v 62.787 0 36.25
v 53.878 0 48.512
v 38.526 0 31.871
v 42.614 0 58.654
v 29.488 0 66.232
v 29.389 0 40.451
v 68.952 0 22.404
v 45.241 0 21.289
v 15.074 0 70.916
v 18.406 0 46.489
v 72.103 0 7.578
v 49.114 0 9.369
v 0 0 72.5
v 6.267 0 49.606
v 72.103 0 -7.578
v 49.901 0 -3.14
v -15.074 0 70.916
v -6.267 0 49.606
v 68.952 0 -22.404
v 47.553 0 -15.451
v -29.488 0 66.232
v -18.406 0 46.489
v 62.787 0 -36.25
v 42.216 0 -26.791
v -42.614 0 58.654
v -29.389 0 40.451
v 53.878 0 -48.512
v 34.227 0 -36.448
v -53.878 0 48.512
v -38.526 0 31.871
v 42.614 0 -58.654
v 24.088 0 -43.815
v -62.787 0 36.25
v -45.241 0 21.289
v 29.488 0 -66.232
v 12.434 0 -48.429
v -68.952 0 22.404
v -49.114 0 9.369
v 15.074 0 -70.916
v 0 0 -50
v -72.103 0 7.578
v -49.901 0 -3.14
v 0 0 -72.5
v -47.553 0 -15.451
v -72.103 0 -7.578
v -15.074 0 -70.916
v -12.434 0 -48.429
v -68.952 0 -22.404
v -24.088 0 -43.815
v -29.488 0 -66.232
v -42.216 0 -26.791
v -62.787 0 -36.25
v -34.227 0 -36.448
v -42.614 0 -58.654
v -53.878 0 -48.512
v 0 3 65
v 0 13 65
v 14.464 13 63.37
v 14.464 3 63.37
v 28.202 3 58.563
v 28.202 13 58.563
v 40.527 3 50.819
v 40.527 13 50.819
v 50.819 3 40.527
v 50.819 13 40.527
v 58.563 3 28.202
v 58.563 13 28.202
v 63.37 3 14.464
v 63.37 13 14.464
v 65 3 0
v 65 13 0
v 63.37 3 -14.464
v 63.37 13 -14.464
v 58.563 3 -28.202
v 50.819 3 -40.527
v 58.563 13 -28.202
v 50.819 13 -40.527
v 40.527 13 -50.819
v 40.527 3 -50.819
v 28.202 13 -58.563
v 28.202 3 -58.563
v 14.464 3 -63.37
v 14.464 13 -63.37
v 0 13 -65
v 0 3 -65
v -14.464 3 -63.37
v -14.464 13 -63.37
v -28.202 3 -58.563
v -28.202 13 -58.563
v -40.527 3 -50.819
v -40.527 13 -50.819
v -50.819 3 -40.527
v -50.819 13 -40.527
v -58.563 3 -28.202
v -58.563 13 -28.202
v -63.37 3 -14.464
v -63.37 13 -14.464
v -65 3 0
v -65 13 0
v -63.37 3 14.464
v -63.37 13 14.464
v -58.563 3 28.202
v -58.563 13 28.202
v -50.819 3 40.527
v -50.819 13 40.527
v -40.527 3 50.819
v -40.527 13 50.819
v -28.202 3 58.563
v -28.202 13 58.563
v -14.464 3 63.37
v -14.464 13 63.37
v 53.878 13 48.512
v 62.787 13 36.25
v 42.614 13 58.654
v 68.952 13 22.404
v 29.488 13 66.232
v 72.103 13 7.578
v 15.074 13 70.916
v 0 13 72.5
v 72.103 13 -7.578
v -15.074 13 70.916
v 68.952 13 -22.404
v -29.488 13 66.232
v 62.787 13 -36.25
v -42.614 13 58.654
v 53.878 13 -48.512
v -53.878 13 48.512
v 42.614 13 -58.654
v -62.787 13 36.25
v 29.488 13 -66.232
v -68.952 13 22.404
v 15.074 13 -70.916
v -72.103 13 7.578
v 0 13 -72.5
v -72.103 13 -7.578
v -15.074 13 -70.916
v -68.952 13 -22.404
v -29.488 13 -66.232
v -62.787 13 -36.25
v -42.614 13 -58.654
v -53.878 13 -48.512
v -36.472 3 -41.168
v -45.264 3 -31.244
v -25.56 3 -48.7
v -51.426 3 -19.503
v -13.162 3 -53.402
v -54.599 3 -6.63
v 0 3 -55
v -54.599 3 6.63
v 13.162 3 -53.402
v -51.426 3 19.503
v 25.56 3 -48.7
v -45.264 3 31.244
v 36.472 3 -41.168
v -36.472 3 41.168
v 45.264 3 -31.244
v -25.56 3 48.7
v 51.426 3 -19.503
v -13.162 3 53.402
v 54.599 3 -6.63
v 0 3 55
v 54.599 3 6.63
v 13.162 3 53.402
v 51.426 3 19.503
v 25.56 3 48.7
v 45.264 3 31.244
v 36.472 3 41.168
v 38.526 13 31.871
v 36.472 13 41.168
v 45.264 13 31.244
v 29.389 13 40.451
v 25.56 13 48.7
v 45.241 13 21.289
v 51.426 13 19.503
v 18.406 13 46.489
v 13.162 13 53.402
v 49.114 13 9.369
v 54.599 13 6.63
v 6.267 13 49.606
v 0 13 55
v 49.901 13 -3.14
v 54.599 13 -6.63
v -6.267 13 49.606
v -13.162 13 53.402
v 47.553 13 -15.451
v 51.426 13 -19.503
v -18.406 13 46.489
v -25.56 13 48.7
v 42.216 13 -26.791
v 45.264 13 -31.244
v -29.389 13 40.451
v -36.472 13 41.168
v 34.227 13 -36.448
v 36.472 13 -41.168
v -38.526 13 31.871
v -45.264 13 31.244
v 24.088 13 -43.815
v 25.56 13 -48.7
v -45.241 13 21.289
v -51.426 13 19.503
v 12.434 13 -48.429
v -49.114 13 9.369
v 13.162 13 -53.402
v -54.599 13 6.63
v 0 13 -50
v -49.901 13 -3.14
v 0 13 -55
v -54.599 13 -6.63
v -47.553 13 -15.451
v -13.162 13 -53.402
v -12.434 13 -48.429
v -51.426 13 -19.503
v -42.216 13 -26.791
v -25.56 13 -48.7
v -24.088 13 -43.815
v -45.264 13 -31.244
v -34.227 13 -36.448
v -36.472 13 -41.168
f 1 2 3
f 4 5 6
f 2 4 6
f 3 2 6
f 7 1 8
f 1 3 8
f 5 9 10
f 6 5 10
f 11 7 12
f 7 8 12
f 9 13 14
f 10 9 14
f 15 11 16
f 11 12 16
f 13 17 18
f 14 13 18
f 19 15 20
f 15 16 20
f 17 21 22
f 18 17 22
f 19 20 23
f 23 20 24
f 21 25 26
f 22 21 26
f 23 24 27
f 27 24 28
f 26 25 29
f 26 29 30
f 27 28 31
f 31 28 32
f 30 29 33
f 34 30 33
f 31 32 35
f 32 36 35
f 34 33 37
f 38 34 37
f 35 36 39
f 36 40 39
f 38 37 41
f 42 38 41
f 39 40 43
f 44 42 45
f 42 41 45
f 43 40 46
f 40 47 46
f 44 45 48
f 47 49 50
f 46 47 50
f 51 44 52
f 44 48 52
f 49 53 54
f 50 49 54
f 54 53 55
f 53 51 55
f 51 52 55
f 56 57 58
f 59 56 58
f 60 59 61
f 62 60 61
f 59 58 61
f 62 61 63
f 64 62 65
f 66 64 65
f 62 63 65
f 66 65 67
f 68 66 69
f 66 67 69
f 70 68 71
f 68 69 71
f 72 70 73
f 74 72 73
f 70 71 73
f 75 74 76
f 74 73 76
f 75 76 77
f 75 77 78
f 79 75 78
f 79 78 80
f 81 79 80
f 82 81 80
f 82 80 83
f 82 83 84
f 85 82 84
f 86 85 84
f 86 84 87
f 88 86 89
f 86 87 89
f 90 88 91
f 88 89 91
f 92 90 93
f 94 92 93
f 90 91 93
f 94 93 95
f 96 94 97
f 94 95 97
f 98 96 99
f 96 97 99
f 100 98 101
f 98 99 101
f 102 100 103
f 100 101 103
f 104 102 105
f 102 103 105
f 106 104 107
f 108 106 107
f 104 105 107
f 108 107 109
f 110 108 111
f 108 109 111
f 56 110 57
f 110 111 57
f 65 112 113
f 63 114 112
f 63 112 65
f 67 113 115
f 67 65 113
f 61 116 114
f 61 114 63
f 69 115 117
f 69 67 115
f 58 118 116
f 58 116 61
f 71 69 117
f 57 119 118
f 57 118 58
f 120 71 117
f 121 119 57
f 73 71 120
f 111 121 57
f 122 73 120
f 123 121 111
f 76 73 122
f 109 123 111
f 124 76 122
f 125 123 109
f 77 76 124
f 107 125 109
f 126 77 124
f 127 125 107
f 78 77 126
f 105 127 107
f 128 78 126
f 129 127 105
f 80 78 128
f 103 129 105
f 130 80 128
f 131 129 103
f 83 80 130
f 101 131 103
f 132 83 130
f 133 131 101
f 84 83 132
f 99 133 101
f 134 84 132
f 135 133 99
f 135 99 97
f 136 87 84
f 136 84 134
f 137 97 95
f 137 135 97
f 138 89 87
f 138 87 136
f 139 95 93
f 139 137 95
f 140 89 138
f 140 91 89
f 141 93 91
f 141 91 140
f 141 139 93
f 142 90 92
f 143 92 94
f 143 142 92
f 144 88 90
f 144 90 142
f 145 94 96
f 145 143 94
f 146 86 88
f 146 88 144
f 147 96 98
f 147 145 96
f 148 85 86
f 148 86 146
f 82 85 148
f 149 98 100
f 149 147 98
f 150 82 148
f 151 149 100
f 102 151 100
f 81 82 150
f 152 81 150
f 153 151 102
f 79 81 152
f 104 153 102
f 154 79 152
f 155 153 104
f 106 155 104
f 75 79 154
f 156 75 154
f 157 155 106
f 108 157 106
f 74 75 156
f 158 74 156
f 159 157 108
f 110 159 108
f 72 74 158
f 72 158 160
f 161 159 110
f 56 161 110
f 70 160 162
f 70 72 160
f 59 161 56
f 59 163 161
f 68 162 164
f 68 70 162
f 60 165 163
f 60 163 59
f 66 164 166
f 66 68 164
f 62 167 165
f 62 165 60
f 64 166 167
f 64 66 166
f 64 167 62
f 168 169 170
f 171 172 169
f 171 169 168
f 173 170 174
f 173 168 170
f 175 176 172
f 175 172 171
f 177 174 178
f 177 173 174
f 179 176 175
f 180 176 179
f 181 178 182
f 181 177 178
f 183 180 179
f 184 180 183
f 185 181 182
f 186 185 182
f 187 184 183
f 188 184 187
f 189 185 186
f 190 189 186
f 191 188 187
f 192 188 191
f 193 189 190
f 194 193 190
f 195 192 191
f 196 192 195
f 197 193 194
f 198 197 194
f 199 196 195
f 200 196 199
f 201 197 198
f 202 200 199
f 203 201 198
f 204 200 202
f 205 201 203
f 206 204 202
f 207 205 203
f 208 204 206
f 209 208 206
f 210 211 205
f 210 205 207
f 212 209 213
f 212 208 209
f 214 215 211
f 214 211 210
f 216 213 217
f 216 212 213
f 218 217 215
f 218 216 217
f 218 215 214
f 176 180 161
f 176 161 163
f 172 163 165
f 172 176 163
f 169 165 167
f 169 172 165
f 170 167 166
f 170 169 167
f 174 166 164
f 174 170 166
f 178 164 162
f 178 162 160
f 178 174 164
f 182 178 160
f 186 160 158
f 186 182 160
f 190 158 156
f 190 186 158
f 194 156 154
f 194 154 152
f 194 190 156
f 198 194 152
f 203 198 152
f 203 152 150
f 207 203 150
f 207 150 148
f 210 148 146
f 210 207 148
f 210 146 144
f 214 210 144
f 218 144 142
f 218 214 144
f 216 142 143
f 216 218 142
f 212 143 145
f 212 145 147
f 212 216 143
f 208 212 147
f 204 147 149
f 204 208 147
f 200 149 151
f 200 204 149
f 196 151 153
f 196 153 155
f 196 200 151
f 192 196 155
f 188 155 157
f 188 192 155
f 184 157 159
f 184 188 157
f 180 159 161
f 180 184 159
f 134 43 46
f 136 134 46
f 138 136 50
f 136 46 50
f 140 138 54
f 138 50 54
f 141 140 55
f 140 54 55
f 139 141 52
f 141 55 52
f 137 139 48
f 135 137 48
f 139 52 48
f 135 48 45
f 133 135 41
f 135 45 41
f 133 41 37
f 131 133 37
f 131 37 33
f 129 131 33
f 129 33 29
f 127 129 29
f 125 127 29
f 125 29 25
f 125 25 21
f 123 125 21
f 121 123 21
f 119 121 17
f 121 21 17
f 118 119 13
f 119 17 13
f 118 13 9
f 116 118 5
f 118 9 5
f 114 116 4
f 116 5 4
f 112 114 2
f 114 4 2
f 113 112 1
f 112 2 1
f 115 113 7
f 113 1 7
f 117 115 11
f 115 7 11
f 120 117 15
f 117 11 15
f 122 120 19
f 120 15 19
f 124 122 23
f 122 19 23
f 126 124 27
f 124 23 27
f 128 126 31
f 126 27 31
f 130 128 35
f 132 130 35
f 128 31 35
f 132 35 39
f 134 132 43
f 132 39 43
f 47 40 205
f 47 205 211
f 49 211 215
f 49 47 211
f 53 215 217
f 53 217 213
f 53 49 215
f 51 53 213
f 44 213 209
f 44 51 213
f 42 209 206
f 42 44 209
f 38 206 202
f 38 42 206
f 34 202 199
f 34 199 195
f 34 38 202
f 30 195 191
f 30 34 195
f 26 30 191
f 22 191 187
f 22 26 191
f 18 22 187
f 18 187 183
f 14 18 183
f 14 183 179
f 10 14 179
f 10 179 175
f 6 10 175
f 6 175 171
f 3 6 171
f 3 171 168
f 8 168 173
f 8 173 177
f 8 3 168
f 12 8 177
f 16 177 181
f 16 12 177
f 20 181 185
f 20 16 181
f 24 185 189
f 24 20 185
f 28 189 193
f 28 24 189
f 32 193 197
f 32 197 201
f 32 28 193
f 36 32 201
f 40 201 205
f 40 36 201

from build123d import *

# Parameters (mm, degrees)
SKETCH_1_R          = 72.5
SKETCH_1_R_2        = 50
EXTRUDE_1_DEPTH     = 13
SKETCH_2_R          = 65
SKETCH_2_R_2        = 55
CUT_EXTRUDE_1_DEPTH = 10


with BuildPart() as part:
    # 草图1 → 凸台-拉伸1 (new body)
    with BuildSketch(Plane(origin=(0, 0, 0), x_dir=(1, 0, 0), z_dir=(0, 1, 0))):
        with Locations(Location((0, 0, 0), (0, 0, 90))):
            Circle(SKETCH_1_R)
        with Locations(Location((0, 0, 0), (0, 0, 90))):
            Circle(SKETCH_1_R_2, mode=Mode.SUBTRACT)
    extrude(amount=EXTRUDE_1_DEPTH)

    # 草图2 → 切除-拉伸1 (cut)
    with BuildSketch(Plane(origin=(0, 13, 0), x_dir=(1, 0, 0), z_dir=(0, 1, 0))):
        with Locations(Location((0, 0, 0), (0, 0, 270))):
            Circle(SKETCH_2_R)
        with Locations(Location((0, 0, 0), (0, 0, 270))):
            Circle(SKETCH_2_R_2, mode=Mode.SUBTRACT)
    extrude(amount=-CUT_EXTRUDE_1_DEPTH, mode=Mode.SUBTRACT)


solid = part.part
